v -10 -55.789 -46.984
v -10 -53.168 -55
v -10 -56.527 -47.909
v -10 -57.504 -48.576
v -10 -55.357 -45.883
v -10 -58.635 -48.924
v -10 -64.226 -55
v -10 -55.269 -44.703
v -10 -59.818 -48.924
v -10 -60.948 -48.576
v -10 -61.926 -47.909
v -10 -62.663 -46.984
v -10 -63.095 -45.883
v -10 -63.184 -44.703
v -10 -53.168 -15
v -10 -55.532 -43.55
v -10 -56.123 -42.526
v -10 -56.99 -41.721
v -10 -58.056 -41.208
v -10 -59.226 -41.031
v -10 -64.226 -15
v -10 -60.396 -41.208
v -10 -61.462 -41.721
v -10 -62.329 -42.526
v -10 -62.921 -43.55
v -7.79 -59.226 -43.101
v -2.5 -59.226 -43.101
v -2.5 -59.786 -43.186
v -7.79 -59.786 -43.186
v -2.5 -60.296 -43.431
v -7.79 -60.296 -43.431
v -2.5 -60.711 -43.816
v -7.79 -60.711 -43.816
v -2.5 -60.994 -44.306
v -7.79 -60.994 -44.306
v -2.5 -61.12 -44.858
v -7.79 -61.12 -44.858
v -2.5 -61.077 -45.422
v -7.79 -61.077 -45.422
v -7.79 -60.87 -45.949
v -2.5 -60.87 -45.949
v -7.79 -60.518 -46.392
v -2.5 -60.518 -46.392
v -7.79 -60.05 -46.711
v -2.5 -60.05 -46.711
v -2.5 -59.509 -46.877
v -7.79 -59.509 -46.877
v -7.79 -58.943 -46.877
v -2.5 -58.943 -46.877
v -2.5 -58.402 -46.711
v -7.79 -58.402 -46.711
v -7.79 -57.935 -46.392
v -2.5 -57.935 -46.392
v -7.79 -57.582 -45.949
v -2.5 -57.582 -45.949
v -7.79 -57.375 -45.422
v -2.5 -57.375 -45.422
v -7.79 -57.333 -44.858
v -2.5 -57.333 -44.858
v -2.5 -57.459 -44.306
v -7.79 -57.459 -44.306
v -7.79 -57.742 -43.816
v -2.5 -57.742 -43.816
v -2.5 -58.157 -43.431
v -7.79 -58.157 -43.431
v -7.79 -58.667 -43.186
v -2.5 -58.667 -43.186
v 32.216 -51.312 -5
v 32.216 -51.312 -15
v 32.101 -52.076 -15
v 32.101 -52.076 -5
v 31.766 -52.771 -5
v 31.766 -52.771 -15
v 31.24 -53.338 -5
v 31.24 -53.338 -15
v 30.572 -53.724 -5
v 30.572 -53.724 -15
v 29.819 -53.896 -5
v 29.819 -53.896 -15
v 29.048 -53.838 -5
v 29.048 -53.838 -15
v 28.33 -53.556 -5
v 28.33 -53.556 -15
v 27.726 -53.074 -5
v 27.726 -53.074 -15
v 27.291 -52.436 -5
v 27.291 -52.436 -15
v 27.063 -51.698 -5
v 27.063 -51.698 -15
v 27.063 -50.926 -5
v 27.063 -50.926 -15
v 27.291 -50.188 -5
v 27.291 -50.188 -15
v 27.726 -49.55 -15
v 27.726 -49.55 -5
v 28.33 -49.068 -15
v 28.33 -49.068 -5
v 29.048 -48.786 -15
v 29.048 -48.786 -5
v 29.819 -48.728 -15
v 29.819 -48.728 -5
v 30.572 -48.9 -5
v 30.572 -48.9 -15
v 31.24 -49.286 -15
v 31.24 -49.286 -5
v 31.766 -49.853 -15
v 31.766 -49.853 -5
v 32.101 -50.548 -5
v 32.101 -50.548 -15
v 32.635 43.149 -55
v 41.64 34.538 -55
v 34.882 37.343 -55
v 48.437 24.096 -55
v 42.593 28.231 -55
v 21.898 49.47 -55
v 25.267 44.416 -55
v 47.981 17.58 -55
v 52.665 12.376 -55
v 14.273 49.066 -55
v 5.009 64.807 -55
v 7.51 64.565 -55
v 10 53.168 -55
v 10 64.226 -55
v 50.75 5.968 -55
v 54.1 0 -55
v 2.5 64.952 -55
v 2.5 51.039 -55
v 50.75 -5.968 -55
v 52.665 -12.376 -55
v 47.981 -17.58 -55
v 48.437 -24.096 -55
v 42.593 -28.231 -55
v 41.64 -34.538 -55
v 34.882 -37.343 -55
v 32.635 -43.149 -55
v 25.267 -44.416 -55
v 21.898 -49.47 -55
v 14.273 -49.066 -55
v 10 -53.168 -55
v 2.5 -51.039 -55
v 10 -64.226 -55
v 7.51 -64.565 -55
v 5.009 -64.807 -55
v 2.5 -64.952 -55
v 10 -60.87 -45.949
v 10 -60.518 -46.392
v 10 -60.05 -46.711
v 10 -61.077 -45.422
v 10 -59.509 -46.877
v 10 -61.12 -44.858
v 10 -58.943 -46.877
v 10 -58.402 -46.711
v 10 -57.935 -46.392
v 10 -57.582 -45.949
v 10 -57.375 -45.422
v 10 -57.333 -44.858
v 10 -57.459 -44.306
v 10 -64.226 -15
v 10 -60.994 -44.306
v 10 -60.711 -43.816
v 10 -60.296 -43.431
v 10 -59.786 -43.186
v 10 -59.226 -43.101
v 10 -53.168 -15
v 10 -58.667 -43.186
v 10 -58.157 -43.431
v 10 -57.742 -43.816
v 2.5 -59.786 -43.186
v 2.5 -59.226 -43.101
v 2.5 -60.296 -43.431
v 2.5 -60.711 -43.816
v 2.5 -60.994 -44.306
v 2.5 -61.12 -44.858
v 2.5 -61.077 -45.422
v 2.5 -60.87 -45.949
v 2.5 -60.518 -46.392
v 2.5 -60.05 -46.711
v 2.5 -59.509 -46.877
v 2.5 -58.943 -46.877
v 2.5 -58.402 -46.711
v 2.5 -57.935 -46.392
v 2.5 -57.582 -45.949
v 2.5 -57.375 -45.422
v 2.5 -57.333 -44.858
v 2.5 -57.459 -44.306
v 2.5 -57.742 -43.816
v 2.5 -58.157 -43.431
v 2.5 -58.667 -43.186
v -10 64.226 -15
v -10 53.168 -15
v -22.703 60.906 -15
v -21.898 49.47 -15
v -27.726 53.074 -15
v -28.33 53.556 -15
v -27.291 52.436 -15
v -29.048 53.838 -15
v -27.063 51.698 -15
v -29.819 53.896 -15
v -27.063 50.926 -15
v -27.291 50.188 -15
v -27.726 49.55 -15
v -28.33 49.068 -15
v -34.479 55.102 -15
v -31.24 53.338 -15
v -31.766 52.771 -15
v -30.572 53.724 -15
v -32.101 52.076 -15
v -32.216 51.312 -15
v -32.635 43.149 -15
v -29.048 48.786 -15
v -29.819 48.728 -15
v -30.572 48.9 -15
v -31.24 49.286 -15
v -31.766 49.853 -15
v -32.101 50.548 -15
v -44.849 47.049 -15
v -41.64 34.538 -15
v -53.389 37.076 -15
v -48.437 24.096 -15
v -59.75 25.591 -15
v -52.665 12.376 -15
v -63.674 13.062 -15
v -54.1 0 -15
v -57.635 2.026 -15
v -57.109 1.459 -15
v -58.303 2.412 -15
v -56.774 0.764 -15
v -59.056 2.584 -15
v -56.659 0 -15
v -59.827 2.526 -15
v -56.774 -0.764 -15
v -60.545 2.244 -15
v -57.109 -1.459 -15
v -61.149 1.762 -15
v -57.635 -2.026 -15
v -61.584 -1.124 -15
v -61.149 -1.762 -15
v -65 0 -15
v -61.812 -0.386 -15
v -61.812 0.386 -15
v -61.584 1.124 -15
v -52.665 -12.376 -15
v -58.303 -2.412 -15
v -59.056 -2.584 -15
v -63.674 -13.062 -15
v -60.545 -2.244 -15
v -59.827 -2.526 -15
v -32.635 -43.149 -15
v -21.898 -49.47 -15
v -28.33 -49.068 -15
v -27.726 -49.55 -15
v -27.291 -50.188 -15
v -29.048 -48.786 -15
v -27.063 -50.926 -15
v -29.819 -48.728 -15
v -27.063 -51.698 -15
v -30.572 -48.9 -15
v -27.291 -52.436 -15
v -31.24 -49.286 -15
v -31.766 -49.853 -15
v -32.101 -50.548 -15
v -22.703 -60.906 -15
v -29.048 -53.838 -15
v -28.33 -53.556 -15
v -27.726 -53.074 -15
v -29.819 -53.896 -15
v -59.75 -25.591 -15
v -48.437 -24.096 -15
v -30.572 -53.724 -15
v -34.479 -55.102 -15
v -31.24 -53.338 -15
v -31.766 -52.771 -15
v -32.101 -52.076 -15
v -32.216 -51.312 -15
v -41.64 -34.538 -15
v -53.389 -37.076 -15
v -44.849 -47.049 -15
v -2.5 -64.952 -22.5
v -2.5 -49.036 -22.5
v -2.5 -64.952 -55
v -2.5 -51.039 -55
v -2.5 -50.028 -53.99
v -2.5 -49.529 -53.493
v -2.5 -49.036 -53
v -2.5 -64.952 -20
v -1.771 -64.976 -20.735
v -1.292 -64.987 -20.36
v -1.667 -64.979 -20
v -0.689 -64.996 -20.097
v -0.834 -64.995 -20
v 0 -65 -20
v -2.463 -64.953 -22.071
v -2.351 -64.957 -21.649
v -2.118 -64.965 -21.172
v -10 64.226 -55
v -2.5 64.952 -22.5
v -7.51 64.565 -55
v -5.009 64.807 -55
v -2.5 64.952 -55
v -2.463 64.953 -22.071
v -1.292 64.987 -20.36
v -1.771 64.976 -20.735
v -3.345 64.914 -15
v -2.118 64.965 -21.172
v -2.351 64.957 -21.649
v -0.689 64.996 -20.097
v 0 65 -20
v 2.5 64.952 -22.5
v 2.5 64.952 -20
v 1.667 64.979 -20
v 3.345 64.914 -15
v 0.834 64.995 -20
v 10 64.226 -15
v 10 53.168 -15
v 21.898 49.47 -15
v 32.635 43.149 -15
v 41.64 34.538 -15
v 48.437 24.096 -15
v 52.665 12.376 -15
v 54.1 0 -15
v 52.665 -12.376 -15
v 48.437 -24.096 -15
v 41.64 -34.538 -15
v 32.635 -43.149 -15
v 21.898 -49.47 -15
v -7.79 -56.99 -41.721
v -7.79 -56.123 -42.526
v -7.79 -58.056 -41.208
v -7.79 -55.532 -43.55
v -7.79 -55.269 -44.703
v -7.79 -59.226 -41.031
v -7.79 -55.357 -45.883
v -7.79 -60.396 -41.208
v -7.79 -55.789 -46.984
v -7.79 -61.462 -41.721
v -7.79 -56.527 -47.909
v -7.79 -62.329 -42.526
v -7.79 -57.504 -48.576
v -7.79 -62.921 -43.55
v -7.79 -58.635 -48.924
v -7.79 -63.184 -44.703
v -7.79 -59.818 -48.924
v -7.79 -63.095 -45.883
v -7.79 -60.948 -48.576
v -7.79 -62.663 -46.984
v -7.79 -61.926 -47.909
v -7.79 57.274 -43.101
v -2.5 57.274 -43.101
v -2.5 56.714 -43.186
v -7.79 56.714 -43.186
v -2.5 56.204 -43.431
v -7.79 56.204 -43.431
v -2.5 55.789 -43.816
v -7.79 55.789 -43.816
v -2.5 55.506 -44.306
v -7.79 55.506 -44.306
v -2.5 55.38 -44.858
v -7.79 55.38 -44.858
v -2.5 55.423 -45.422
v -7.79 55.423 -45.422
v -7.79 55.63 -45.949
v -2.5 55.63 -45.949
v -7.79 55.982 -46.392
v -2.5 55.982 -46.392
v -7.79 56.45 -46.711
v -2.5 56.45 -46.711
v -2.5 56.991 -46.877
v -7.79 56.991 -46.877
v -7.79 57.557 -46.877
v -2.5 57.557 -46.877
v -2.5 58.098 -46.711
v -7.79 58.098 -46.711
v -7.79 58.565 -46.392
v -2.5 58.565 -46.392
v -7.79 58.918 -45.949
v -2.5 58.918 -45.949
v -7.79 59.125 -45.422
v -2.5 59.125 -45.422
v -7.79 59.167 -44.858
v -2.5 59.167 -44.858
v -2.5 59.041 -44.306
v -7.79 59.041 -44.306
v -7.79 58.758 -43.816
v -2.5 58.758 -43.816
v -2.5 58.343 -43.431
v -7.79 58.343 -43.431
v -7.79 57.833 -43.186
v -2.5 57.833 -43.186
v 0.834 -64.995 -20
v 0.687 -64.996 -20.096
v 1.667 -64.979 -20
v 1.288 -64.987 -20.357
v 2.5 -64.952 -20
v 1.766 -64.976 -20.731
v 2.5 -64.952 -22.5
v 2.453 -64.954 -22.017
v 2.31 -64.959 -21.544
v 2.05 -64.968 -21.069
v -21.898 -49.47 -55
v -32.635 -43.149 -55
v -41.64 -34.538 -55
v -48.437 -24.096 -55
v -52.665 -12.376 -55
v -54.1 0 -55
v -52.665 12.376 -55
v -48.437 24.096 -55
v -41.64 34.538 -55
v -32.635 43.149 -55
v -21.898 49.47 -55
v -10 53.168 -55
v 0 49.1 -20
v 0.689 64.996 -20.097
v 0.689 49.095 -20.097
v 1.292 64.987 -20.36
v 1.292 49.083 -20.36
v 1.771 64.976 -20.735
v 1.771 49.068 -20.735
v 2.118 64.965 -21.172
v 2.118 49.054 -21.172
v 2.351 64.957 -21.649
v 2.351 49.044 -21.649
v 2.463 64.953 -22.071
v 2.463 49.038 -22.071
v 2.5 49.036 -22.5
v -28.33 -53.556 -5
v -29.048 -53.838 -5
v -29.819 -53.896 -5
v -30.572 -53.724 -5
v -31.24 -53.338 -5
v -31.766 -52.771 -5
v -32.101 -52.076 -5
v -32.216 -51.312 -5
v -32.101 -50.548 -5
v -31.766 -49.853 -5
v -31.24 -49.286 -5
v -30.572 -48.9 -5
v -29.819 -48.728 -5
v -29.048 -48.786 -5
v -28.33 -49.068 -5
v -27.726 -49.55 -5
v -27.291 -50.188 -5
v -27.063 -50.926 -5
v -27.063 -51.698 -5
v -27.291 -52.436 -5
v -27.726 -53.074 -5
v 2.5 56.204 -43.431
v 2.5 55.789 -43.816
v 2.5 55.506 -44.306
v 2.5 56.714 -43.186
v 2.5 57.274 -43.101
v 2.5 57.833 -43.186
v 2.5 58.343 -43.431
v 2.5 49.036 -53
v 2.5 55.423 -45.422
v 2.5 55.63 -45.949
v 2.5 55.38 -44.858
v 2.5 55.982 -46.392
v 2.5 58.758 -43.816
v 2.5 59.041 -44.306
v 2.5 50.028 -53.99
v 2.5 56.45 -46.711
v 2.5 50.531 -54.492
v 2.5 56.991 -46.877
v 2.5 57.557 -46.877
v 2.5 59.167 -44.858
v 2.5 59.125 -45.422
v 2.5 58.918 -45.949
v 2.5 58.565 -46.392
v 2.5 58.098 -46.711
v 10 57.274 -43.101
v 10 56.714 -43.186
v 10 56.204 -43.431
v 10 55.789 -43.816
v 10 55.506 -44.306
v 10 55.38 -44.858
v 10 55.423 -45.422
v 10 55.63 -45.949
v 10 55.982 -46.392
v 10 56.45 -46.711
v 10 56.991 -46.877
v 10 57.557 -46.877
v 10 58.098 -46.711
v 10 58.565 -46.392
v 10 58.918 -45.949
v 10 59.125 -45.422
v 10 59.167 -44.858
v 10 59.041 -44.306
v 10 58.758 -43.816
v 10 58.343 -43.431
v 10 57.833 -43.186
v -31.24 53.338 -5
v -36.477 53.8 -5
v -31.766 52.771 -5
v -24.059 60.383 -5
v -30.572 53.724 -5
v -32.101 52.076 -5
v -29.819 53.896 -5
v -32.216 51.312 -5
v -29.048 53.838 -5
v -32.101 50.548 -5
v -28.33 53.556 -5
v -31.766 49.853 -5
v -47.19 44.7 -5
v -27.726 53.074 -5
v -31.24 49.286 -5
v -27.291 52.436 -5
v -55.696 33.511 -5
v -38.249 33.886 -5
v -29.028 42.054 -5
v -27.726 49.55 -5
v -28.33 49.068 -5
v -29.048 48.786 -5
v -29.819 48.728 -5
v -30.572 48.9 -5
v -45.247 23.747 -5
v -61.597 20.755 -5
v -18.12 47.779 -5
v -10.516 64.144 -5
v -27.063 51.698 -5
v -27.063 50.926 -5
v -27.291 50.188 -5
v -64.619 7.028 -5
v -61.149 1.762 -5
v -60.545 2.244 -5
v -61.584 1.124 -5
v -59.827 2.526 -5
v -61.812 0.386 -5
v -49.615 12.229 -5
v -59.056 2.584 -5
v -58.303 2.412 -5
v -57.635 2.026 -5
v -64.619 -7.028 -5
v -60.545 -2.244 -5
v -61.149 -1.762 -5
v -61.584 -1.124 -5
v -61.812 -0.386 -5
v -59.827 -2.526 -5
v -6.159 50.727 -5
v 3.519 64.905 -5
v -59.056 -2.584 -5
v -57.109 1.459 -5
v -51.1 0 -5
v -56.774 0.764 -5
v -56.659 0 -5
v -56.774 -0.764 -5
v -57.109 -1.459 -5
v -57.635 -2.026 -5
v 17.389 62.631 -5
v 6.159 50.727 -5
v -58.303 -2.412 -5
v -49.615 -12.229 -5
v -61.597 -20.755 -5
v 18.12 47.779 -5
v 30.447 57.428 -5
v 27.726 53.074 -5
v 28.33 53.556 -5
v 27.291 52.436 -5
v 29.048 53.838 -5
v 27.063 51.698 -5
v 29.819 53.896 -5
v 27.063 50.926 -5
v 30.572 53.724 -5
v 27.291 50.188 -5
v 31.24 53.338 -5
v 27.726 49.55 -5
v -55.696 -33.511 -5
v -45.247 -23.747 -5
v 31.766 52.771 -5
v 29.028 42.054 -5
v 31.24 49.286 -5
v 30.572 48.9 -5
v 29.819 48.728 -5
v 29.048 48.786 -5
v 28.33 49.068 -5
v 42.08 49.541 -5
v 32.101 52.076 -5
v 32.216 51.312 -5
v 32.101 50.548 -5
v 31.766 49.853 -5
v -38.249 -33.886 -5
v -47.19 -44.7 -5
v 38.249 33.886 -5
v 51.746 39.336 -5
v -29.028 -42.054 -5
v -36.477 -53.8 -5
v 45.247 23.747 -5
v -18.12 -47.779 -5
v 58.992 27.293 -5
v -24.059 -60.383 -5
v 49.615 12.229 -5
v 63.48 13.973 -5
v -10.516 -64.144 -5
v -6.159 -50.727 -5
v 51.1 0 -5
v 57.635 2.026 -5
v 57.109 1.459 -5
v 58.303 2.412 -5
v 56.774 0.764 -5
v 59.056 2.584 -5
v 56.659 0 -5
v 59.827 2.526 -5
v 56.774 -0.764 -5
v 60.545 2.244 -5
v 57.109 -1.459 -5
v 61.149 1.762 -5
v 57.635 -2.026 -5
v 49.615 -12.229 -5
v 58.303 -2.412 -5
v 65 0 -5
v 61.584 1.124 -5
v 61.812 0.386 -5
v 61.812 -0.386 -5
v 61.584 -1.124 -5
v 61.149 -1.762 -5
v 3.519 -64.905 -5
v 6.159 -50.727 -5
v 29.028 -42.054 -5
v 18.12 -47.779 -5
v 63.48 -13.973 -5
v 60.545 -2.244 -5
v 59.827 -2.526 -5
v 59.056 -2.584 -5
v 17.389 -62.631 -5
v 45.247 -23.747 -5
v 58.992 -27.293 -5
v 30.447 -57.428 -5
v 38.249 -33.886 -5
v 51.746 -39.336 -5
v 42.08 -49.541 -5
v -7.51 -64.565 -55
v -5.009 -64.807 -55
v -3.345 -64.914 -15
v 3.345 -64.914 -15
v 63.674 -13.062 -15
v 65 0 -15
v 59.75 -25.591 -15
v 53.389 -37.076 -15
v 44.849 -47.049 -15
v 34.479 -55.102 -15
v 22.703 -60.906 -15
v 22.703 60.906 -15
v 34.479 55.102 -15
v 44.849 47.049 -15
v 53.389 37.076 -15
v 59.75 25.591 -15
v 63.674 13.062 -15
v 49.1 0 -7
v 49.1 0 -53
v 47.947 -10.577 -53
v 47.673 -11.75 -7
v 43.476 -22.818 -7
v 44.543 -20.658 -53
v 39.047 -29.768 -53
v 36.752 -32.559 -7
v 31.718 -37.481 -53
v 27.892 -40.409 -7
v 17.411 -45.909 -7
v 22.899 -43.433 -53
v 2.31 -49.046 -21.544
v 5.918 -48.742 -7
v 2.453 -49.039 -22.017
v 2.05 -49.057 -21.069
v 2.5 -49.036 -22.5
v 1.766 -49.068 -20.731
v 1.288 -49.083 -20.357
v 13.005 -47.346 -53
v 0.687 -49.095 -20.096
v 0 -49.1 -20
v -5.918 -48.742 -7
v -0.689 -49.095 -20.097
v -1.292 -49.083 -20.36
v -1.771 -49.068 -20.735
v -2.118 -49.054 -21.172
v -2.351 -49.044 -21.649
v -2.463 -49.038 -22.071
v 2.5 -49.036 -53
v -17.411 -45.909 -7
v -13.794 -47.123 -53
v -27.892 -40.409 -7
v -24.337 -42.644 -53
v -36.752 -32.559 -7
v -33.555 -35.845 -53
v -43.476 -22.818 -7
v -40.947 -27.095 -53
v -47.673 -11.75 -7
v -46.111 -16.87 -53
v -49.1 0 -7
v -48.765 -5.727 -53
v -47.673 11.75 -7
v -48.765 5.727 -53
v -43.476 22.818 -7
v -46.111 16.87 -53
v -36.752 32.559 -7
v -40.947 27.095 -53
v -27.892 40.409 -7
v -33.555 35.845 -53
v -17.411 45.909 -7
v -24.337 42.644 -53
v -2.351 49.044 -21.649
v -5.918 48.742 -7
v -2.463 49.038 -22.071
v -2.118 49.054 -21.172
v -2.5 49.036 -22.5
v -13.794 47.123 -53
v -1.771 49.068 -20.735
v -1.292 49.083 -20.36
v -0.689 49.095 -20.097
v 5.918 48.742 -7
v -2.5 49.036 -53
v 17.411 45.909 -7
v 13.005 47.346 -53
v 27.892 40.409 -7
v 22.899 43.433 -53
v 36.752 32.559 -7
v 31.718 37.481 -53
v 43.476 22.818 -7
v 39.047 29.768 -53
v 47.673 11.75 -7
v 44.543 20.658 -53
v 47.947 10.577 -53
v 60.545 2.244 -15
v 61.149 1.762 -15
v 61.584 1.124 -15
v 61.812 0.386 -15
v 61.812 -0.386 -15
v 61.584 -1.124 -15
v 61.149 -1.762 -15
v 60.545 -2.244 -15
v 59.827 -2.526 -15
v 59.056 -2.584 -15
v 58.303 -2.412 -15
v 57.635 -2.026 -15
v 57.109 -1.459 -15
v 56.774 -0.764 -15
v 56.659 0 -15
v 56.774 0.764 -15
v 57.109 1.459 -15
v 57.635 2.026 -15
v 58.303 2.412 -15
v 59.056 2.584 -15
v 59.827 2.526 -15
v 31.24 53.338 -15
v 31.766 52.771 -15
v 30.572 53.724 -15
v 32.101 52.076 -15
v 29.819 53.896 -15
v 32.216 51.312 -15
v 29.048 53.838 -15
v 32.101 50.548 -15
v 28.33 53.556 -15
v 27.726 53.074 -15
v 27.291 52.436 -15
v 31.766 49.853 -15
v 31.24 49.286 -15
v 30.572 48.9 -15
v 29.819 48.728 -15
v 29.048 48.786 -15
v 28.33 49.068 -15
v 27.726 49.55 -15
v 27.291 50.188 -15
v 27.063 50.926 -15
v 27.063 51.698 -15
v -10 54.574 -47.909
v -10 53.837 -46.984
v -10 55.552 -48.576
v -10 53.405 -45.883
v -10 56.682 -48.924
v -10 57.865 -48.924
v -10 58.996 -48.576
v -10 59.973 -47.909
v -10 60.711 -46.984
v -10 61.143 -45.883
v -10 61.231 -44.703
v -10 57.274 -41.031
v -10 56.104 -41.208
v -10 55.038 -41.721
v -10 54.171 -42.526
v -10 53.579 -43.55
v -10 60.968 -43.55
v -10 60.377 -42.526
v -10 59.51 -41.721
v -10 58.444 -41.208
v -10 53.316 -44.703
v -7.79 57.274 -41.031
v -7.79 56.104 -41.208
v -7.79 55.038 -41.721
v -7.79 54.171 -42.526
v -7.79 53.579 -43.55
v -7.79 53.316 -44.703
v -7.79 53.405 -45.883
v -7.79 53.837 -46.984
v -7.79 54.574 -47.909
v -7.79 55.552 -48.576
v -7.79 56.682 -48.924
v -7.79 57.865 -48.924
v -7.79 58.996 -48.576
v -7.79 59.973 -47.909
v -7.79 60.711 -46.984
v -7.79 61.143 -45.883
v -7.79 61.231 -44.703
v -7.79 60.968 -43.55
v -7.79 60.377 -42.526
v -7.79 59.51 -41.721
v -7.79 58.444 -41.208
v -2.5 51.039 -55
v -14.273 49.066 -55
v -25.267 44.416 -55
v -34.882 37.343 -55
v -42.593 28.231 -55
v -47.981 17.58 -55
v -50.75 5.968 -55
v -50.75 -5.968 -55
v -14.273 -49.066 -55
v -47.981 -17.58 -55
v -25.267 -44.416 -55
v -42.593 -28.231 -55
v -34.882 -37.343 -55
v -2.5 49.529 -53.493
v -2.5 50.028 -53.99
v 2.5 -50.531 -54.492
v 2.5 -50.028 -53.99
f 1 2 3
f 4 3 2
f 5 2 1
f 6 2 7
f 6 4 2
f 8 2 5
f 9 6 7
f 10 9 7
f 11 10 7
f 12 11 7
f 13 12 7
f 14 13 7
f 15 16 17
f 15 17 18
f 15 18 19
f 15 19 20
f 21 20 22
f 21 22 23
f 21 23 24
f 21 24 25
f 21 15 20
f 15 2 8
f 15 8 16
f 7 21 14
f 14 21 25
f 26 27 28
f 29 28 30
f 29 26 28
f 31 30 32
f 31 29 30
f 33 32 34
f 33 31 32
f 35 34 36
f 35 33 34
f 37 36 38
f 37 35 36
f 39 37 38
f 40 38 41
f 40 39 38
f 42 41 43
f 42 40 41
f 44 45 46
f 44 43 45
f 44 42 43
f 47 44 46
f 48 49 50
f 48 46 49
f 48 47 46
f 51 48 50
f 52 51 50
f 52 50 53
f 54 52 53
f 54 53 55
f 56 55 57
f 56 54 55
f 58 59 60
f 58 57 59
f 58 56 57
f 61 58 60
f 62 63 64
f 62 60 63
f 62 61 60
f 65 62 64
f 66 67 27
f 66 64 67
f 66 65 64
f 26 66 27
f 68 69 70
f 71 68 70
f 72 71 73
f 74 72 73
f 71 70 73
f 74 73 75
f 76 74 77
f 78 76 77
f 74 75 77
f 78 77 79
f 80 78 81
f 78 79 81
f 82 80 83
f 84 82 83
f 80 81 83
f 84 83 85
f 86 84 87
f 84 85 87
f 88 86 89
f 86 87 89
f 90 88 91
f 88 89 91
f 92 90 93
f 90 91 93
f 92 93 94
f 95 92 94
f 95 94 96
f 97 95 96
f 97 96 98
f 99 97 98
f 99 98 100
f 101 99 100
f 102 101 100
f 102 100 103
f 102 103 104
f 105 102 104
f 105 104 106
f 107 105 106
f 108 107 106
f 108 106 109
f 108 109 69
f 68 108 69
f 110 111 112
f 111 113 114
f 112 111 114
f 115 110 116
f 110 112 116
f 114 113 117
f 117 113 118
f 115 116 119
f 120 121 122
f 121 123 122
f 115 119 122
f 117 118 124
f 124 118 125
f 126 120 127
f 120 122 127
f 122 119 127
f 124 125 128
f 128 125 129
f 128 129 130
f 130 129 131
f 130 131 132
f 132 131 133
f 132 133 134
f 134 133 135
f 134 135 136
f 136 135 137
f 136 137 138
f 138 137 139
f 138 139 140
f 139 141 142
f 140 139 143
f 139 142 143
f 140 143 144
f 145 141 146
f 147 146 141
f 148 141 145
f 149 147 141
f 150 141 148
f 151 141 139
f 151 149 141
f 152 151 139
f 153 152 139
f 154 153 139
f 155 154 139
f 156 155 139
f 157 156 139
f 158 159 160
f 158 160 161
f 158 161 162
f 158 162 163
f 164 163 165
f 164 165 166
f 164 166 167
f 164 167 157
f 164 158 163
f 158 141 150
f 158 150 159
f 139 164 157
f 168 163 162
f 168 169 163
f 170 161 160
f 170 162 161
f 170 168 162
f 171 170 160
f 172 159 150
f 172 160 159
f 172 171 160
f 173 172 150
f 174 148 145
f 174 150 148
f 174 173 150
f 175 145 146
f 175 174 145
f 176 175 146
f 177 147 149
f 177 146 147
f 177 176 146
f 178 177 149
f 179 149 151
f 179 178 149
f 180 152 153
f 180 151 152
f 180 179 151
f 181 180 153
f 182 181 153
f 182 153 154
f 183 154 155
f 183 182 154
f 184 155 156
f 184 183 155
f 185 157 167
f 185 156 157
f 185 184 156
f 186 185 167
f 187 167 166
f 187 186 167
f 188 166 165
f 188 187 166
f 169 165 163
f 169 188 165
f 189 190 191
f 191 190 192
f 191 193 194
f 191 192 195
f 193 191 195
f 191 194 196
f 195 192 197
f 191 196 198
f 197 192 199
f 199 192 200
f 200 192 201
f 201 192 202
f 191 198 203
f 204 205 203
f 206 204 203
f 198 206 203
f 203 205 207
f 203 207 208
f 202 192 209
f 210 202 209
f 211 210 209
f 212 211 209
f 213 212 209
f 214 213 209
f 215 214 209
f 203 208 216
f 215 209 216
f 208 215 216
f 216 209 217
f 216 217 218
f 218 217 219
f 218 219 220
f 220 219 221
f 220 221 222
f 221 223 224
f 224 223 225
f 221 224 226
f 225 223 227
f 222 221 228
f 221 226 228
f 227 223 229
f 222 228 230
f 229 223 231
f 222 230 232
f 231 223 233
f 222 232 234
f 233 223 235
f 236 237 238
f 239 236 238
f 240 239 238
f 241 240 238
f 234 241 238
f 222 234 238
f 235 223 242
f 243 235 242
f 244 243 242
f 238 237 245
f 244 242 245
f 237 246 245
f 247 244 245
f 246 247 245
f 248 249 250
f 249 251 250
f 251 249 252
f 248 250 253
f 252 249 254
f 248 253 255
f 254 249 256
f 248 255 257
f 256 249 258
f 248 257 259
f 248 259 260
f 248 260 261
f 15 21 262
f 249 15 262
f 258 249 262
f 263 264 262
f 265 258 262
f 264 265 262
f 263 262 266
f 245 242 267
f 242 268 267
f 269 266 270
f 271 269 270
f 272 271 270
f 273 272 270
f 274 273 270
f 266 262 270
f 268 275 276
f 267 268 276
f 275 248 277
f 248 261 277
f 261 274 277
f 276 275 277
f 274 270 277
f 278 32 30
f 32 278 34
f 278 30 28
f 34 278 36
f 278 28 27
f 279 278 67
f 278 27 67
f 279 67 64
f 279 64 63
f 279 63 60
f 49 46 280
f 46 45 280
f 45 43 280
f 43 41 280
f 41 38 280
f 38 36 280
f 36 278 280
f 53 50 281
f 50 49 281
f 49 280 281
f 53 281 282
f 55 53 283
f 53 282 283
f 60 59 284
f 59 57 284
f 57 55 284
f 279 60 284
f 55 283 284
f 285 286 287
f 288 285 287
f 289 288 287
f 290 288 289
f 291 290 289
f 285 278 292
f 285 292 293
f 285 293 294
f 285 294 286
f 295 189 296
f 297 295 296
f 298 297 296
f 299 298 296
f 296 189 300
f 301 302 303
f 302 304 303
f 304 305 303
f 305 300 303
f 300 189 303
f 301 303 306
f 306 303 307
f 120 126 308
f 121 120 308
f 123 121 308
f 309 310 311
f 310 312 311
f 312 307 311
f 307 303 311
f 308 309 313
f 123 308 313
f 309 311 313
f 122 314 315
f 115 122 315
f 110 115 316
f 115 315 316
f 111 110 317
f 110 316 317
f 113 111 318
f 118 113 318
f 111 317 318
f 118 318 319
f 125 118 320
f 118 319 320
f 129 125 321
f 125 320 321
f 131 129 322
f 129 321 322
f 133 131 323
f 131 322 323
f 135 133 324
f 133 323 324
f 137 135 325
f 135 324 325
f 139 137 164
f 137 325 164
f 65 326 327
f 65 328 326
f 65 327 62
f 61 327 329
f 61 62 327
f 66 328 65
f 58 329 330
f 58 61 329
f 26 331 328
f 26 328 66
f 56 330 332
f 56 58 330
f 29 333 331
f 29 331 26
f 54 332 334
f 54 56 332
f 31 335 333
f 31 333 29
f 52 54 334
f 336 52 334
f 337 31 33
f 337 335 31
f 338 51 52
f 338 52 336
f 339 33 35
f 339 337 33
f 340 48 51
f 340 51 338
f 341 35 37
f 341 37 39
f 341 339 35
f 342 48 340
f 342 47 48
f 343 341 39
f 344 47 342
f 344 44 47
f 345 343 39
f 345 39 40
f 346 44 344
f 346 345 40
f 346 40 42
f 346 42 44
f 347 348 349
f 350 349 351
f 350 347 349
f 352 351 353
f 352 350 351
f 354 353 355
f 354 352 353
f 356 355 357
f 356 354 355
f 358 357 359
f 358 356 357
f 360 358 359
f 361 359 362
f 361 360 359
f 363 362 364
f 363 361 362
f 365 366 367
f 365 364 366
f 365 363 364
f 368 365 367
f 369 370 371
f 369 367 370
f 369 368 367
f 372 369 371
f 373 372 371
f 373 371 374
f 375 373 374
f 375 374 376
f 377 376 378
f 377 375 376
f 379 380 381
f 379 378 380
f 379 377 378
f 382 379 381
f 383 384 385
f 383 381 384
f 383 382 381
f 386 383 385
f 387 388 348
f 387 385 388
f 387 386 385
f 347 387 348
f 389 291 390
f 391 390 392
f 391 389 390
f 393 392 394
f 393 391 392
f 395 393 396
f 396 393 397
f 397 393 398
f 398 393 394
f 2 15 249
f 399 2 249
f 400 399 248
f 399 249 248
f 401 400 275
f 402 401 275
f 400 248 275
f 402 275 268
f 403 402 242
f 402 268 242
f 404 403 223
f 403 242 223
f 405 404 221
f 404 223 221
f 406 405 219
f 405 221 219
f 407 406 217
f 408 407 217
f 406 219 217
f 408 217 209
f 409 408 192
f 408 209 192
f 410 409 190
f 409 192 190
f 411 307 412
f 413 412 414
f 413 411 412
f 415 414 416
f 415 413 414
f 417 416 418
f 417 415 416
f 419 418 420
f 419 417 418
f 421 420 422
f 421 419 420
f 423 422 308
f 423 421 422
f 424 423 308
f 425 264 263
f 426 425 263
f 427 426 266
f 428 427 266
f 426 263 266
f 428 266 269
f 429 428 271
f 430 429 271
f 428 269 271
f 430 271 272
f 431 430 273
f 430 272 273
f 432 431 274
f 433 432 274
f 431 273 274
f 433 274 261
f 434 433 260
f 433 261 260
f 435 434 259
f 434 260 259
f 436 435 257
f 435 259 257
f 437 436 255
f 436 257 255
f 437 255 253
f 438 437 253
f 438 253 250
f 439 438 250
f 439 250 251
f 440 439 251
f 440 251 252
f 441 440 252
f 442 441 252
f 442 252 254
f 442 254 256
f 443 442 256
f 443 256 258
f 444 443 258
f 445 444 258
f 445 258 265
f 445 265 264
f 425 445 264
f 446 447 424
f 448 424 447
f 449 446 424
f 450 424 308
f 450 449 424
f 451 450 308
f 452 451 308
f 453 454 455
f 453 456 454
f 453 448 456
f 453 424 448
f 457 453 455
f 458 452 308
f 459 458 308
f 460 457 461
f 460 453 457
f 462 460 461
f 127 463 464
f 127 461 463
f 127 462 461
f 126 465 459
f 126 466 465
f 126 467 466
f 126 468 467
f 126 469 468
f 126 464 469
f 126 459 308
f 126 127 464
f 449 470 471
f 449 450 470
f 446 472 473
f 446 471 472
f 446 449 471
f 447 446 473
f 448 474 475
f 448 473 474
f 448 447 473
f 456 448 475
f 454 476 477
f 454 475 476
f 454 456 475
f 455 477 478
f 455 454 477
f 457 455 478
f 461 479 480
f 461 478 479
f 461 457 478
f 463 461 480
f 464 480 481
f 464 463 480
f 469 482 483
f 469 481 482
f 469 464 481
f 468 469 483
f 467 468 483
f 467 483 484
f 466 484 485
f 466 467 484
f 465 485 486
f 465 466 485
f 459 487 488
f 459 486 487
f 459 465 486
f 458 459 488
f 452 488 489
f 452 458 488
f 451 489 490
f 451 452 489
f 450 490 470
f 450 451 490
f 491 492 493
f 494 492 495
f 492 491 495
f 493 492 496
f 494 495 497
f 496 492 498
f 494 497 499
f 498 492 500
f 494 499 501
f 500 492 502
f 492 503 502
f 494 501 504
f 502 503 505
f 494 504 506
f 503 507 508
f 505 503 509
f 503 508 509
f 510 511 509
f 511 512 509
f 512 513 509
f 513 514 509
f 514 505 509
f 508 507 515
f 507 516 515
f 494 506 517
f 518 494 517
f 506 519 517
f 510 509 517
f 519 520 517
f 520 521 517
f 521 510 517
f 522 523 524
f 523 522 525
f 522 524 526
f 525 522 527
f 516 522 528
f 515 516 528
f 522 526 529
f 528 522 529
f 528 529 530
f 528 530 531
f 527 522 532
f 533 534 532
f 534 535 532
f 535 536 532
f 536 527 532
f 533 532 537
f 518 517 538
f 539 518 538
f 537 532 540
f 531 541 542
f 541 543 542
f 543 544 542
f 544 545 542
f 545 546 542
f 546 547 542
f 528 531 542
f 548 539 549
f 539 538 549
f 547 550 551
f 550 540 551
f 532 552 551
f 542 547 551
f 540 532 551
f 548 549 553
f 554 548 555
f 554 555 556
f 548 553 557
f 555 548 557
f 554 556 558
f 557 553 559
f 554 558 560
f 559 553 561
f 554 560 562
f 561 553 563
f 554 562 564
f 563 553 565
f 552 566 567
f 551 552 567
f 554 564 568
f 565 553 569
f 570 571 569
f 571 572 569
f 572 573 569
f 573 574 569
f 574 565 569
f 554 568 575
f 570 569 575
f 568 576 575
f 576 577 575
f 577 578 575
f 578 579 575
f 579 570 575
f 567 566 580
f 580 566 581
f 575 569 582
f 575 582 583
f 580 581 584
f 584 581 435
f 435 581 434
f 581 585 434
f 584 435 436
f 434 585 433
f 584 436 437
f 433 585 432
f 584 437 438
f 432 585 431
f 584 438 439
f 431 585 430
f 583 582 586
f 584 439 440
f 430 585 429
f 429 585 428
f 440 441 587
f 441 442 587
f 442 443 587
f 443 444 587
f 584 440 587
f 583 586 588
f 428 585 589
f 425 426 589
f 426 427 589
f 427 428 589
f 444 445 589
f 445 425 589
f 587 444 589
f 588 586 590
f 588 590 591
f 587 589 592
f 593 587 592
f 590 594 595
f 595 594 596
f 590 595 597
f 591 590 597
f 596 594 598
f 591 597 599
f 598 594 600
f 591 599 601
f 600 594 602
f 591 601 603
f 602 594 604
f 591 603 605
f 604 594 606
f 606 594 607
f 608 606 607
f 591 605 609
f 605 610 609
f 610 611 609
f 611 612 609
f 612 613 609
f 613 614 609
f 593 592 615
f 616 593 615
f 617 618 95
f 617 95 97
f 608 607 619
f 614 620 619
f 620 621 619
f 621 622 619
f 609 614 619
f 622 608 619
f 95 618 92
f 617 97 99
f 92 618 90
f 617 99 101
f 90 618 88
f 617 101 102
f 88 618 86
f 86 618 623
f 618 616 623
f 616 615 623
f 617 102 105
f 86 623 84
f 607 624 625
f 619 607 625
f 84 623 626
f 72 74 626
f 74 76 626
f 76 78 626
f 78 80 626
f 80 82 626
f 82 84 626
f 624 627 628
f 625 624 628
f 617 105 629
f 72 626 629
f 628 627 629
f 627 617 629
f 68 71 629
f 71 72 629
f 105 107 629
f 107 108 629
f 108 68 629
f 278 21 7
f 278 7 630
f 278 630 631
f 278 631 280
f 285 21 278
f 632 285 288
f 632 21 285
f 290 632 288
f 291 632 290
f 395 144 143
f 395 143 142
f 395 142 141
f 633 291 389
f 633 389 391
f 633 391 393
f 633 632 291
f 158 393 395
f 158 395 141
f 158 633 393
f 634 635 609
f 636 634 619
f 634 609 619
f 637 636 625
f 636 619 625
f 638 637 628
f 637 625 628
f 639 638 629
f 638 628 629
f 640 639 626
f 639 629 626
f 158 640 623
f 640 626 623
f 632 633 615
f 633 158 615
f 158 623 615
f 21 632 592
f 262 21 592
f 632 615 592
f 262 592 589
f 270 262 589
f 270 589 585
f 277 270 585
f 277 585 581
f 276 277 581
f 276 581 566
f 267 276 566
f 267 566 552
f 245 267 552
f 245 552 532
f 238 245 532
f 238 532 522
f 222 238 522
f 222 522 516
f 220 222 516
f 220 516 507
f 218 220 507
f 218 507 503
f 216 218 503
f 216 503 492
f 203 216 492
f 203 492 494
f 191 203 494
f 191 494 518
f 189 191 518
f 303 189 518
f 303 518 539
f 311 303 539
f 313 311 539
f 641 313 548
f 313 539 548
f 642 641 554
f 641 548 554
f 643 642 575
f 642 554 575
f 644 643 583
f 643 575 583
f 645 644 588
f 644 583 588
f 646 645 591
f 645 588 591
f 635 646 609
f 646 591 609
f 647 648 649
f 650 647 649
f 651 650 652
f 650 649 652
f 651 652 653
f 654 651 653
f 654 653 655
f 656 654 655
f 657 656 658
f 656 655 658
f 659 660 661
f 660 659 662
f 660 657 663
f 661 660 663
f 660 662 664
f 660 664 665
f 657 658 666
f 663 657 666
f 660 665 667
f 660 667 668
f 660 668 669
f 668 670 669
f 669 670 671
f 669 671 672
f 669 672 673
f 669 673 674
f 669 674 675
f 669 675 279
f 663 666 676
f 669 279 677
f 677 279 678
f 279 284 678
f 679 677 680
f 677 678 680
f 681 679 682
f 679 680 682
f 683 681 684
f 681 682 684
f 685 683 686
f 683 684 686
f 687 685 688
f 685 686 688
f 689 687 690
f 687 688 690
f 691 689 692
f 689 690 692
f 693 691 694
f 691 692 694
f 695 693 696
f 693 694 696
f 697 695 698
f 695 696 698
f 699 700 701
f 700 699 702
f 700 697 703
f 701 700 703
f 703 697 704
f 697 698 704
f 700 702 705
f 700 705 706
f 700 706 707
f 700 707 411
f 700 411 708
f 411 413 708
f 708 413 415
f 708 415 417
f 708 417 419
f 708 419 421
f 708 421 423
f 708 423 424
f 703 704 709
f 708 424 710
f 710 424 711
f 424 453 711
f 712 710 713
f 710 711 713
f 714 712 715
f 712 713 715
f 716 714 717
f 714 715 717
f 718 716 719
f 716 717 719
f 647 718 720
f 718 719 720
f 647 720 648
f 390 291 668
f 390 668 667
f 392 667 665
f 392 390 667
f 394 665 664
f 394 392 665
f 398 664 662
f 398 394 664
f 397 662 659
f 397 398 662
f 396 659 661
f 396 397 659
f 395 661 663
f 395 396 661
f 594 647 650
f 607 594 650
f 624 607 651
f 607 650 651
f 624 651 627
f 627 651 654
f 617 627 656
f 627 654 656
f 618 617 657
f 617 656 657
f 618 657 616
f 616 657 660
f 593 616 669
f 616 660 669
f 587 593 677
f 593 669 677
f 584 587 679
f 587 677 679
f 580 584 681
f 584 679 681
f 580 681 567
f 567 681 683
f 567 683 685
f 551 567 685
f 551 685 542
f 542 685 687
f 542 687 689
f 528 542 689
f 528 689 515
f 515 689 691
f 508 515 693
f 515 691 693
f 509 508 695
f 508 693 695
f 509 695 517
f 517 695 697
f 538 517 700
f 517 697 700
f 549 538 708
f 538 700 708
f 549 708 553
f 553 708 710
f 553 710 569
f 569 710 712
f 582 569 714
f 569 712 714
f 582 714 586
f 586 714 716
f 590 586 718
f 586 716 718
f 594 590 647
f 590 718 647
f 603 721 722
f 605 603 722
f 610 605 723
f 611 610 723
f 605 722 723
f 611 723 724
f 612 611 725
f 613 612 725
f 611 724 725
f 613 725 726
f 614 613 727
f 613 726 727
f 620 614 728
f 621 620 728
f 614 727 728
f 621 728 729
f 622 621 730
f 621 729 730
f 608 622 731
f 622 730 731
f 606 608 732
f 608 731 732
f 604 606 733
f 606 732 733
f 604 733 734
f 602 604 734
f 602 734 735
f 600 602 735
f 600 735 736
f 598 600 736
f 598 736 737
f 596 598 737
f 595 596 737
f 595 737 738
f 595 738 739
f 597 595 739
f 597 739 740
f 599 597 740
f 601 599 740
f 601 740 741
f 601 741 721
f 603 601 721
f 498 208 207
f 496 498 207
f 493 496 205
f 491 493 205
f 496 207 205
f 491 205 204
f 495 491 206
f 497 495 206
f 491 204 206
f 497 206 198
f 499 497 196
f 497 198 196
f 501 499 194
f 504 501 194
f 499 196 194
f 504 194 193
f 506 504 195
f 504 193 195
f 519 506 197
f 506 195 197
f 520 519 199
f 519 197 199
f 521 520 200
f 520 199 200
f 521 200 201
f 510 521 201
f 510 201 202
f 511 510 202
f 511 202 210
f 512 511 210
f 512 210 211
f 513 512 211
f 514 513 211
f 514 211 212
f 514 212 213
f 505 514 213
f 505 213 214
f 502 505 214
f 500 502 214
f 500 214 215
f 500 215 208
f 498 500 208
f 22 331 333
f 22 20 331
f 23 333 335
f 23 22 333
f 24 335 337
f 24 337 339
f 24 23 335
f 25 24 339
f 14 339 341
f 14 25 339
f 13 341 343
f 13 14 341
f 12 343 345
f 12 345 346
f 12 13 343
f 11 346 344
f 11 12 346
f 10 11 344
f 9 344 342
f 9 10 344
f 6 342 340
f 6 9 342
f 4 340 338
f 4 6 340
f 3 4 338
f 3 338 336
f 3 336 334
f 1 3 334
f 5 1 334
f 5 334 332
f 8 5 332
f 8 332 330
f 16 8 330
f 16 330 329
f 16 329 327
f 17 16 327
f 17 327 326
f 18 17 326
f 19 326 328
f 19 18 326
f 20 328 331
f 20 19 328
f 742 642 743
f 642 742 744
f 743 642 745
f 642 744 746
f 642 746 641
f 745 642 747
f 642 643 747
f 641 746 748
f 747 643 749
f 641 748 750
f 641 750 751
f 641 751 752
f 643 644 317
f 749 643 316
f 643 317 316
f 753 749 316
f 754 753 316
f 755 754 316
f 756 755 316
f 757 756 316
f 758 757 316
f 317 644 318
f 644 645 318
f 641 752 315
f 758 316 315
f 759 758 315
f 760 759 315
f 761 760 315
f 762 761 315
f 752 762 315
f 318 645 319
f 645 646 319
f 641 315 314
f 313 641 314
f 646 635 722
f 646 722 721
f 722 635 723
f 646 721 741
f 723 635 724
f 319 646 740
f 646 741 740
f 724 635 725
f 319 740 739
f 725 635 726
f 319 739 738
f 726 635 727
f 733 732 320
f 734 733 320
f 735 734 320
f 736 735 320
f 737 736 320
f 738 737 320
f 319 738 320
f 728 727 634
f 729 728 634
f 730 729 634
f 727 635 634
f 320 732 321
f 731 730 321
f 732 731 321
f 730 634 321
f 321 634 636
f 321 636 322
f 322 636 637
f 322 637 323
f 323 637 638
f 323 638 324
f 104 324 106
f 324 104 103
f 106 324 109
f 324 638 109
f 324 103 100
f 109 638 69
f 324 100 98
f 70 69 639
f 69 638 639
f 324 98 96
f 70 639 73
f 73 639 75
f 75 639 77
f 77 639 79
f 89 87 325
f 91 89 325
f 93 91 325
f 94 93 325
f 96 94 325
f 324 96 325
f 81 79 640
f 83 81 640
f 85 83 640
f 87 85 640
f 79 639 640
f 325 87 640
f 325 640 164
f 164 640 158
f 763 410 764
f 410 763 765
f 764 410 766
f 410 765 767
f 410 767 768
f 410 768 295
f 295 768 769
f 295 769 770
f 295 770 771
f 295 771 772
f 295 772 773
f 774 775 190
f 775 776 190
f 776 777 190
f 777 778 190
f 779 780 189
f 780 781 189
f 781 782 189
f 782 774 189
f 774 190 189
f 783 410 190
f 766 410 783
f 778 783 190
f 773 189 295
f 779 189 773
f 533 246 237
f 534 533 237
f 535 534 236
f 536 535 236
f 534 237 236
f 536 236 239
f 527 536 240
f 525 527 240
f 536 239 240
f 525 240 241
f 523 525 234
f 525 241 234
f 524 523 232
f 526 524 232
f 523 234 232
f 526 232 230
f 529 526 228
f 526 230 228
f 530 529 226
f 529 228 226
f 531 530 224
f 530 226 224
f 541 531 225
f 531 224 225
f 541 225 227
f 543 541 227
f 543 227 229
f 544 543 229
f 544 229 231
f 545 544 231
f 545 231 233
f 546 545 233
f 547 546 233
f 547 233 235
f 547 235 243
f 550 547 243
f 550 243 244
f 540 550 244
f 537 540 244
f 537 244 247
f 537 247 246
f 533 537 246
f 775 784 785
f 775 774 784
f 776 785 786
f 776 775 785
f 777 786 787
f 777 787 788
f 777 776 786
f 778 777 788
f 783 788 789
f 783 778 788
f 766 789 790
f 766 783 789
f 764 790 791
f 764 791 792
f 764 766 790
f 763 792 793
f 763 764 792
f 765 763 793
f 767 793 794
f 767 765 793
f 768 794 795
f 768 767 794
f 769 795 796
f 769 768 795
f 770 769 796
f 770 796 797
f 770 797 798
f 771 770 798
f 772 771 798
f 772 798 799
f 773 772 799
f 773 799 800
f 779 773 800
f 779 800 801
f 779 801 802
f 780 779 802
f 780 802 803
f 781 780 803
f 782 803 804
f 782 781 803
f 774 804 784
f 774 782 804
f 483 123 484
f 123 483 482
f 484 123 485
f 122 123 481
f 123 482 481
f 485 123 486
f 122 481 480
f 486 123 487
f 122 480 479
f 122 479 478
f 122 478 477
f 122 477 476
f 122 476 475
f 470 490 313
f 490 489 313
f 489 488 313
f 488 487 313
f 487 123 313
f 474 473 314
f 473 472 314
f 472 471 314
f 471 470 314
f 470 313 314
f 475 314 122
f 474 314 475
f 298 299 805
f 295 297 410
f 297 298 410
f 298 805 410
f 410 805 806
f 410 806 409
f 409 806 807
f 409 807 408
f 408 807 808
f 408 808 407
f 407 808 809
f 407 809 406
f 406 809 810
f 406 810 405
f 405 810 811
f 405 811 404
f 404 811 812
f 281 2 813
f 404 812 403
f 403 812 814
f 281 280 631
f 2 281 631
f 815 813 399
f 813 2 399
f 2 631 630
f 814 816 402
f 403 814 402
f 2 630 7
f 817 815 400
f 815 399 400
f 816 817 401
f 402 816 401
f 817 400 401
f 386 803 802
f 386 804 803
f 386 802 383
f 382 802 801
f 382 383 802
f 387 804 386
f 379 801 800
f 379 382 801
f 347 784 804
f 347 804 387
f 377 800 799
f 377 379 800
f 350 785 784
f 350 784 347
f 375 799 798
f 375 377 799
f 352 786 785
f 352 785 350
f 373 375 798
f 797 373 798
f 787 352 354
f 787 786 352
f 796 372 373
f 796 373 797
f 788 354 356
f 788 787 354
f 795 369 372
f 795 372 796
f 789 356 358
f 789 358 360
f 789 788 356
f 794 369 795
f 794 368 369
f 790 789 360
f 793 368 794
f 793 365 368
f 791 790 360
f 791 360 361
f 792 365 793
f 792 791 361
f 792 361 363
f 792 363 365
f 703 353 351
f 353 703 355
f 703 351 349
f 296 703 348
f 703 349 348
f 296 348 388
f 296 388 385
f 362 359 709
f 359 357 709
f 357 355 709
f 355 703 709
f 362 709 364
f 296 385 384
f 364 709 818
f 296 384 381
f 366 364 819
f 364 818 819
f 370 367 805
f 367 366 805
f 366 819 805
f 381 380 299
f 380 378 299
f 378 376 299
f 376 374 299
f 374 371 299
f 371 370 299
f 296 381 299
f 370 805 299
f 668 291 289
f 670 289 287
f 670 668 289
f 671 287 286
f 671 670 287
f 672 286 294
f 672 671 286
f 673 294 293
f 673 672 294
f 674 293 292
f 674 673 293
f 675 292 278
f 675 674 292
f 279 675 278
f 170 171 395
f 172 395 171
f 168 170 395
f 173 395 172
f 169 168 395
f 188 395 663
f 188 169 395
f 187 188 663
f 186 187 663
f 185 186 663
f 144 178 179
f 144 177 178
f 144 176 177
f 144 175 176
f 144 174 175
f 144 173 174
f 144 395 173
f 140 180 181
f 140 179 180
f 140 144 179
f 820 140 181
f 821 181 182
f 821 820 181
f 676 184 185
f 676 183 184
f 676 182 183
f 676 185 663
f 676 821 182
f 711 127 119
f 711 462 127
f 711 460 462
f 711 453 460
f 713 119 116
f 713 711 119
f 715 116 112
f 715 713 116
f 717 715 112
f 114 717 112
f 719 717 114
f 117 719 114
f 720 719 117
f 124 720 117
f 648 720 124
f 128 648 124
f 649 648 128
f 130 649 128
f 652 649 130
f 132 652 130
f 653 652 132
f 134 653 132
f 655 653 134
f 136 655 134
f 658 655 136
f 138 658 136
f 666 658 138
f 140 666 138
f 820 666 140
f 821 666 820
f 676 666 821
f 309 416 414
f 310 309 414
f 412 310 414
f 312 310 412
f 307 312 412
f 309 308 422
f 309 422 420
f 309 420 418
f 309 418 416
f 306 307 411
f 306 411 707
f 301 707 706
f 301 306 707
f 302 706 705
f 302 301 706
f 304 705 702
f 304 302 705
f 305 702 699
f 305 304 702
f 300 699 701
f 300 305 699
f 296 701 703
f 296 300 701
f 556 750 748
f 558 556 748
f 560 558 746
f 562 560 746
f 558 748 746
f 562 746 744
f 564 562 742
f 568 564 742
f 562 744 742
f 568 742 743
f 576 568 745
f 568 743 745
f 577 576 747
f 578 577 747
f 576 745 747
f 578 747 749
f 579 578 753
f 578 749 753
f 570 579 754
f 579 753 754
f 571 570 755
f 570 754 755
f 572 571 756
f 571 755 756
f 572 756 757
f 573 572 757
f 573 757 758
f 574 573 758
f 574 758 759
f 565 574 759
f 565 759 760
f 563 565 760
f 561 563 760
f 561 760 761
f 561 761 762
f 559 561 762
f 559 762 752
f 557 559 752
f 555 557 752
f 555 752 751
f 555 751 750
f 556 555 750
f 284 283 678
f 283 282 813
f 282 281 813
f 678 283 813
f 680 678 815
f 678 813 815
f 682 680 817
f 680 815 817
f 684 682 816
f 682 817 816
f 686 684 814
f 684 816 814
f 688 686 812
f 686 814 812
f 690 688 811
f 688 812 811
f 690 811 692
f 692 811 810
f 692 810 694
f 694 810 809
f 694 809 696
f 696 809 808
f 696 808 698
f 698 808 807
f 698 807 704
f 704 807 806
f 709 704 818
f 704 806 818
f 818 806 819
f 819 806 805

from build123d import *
from build123d.topology import SkipClean

# Parameters (mm, degrees)
BOSS_EXTRUDE1_DEPTH        = 40
SKETCH3_W                  = 5
SKETCH3_H                  = 136
CUT_EXTRUDE1_DEPTH         = 35
FILLET1_R                  = 2.5
CHAMFER1_SIZE              = 2
CHAMFER2_SIZE              = 2
F_6_0_204_DIAMETER_HOLE1_D = 5.1816
CIRPATTERN1_COUNT          = 6
LPATTERN1_COUNT            = 2
LPATTERN1_PITCH            = 116.5


with BuildPart() as part:
    # Sketch1 → Revolve1 (revolve)
    with BuildSketch(Plane(origin=(0, 0, 0), x_dir=(0, 0, -1), z_dir=(1, 0, 0)), mode=Mode.PRIVATE) as revolve1_sk:
        Polygon((5, 49.1), (55, 49.1), (55, 54.1), (15, 54.1), (15, 65), (5, 65), align=None)
    revolve(revolve1_sk.sketch.rotate(Axis((0, 0, 0), (0, 0, -1)), 90), axis=Axis((0, 0, 0), (0, 0, -1)))

    # Sketch2 → Boss-Extrude1 (add)
    with BuildSketch(Plane(origin=(0, 0, -15), x_dir=(-1, 0, 0), z_dir=(0, 0, -1))):
        with BuildLine():
            Line((-10, 64.226162893), (-10, 53.167753385))
            ThreePointArc((-10, 53.167753385), (0, 54.1), (10, 53.167753385))
            Line((10, 53.167753385), (10, 64.226162893))
            ThreePointArc((10, 64.226162893), (0, 65), (-10, 64.226162893))
        make_face()
    boss_extrude1 = extrude(amount=BOSS_EXTRUDE1_DEPTH)

    # Mirror1: Boss-Extrude1 across plane
    with SkipClean():  # the faces are left unmerged after this step: merging them gives an invalid solid
        add(boss_extrude1.mirror(Plane.ZX))

    # Sketch3 → Cut-Extrude1 (cut)
    with BuildSketch(Plane(origin=(0, 0, -55), x_dir=(-1, 0, 0), z_dir=(0, 0, -1))):
        with Locations((0, -0.177278441)):
            Rectangle(SKETCH3_W, SKETCH3_H)
    extrude(amount=-CUT_EXTRUDE1_DEPTH, mode=Mode.SUBTRACT)

    # Fillet1
    # the kernel refuses this fillet: 2.5 mm, written as the material it adds along each edge
    with BuildSketch(Plane(origin=(2.5, -71.201905284, -20), x_dir=(-1, 0, 0), z_dir=(0, 1, 0))) as fillet1_piece_1_section:
        with BuildLine():
            CenterArc((FILLET1_R, -FILLET1_R), FILLET1_R, 90, 90)
            Line((0, -FILLET1_R), (0, 0))
            Line((0, 0), (FILLET1_R, 0))
        make_face()
    fillet1_piece_1 = extrude(amount=28.415592209, mode=Mode.PRIVATE)
    fillet1_piece_1 = fillet1_piece_1 - Plane(origin=(0, 0, -20.566080782), x_dir=(1, 0, 0), z_dir=(0, 0, -1)) * Cylinder(49.1, 67, mode=Mode.PRIVATE)
    fillet1_piece_1 = fillet1_piece_1 & Plane(origin=(0, 0, -20.566080782), x_dir=(-0.15384615384615422, -0.9880948137434714, 0), z_dir=(0, 0, 1)) * Cylinder(65, 67, mode=Mode.PRIVATE)
    with BuildSketch(Plane(origin=(2.5, 42.786313075, -20), x_dir=(0, 0, -1), z_dir=(0, 1, 0))) as fillet1_piece_2_section:
        with BuildLine():
            CenterArc((FILLET1_R, FILLET1_R), FILLET1_R, 180, 90)
            Line((0, FILLET1_R), (0, 0))
            Line((0, 0), (FILLET1_R, 0))
        make_face()
    fillet1_piece_2 = extrude(amount=28.415592209, mode=Mode.PRIVATE)
    fillet1_piece_2 = fillet1_piece_2 - Plane(origin=(0, 0, -20.566075474), x_dir=(1, 0, 0), z_dir=(0, 0, -1)) * Cylinder(49.1, 67, mode=Mode.PRIVATE)
    fillet1_piece_2 = fillet1_piece_2 & Plane(origin=(0, 0, -20.566075474), x_dir=(1, 0, 0), z_dir=(0, 0, 1)) * Cylinder(65, 67, mode=Mode.PRIVATE)
    with BuildSketch(Plane(origin=(-2.5, -42.786313075, -20), x_dir=(0, 0, -1), z_dir=(0, -1, 0))) as fillet1_piece_3_section:
        with BuildLine():
            CenterArc((FILLET1_R, FILLET1_R), FILLET1_R, 180, 90)
            Line((0, FILLET1_R), (0, 0))
            Line((0, 0), (FILLET1_R, 0))
        make_face()
    fillet1_piece_3 = extrude(amount=28.415592209, mode=Mode.PRIVATE)
    fillet1_piece_3 = fillet1_piece_3 - Plane(origin=(0, 0, -20.566082494), x_dir=(1, 0, 0), z_dir=(0, 0, -1)) * Cylinder(49.1, 67, mode=Mode.PRIVATE)
    fillet1_piece_3 = fillet1_piece_3 & Plane(origin=(0, 0, -20.566082494), x_dir=(-0.15384615384615422, -0.9880948137434714, 0), z_dir=(0, 0, 1)) * Cylinder(65, 67, mode=Mode.PRIVATE)
    with BuildSketch(Plane(origin=(-2.5, 71.201905284, -20), x_dir=(1, 0, 0), z_dir=(0, -1, 0))) as fillet1_piece_4_section:
        with BuildLine():
            CenterArc((FILLET1_R, -FILLET1_R), FILLET1_R, 90, 90)
            Line((0, -FILLET1_R), (0, 0))
            Line((0, 0), (FILLET1_R, 0))
        make_face()
    fillet1_piece_4 = extrude(amount=28.415592209, mode=Mode.PRIVATE)
    fillet1_piece_4 = fillet1_piece_4 - Plane(origin=(0, 0, -20.566085883), x_dir=(1, 0, 0), z_dir=(0, 0, -1)) * Cylinder(49.1, 67, mode=Mode.PRIVATE)
    fillet1_piece_4 = fillet1_piece_4 & Plane(origin=(0, 0, -20.566085883), x_dir=(1, 0, 0), z_dir=(0, 0, 1)) * Cylinder(65, 67, mode=Mode.PRIVATE)
    add([fillet1_piece_1, fillet1_piece_2, fillet1_piece_3, fillet1_piece_4])

    # Chamfer1
    chamfer1_edges = [part.edges().sort_by_distance(p)[0] for p in [
        (-49.1, 0, -55),
        (35.591853, -33.823512532, -55),
    ]]
    chamfer(chamfer1_edges, length=CHAMFER1_SIZE)

    # Chamfer2
    chamfer2_edges = [part.edges().sort_by_distance(p)[0] for p in [
        (-49.1, 0, -5),
    ]]
    chamfer(chamfer2_edges, length=CHAMFER2_SIZE)

    # #6 (0.204) Diameter Hole1 (through all)
    with Locations(Plane.XY.offset(-5)):
        with Locations((-29.625, 51.312005174)):
            f_6_0_204_diameter_hole1 = Hole(F_6_0_204_DIAMETER_HOLE1_D / 2)

    # CirPattern1: #6 (0.204) Diameter Hole1 ×6 about axis
    with SkipClean():  # the faces are left unmerged after this step: merging them gives an invalid solid
        cirpattern1_axis = Axis((0, 0, 0), (0, 0, 1))
        for i in range(1, CIRPATTERN1_COUNT):
            add(f_6_0_204_diameter_hole1.rotate(cirpattern1_axis, i * 360 / CIRPATTERN1_COUNT), mode=Mode.SUBTRACT)

    # Sketch8 → CBORE for #6 Binding Head Machine Screw1 (revolve, cut)
    with SkipClean():  # the faces are left unmerged after this step: merging them gives an invalid solid
        with BuildSketch(Plane(origin=(-10, -59.226162893, -45), x_dir=(0, 0, 1), z_dir=(0, 1, 0))):
            Polygon((0, 0), (0, 26.140824014), (1.89865, 25), (1.89865, 2.2098), (3.96875, 2.2098), (3.96875, 0), align=None)
        cbore_for_6_binding_head_machine_screw1 = revolve(axis=Axis((-16.35, -59.226162893, -45), (1, 0, 0)), mode=Mode.SUBTRACT)

    # LPattern1: CBORE for #6 Binding Head Machine Screw1 ×2
    with SkipClean():  # the faces are left unmerged after this step: merging them gives an invalid solid
        with Locations(*[(0, i * LPATTERN1_PITCH, 0) for i in range(1, LPATTERN1_COUNT)]):
            add(cbore_for_6_binding_head_machine_screw1, mode=Mode.SUBTRACT)


solid = part.part
